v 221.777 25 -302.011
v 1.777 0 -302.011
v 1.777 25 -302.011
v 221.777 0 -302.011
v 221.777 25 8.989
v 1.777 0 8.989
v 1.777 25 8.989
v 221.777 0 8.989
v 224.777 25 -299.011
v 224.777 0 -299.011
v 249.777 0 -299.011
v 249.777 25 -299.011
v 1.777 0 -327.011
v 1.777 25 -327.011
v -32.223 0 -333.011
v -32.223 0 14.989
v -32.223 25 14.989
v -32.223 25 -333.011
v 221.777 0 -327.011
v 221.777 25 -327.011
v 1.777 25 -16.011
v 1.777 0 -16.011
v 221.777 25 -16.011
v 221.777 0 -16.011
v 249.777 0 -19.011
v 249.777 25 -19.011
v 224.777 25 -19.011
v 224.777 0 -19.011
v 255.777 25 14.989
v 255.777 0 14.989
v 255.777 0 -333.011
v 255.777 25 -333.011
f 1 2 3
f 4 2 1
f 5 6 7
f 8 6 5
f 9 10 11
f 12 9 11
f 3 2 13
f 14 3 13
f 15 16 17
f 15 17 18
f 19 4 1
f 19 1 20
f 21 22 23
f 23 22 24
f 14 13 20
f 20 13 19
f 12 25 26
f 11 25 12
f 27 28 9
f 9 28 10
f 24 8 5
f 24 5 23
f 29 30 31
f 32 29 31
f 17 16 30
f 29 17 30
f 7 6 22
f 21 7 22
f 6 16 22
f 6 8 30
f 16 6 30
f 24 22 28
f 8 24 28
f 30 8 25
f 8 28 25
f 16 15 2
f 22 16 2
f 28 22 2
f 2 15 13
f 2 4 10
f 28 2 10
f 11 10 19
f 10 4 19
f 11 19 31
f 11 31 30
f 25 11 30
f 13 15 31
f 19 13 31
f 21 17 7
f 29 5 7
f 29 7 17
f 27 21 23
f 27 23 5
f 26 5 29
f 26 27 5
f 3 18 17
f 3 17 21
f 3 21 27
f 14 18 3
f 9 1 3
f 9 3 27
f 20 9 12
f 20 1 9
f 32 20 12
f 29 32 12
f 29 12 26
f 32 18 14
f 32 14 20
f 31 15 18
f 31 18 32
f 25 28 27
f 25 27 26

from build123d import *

# Parameters (mm, degrees)
SKETCH1_W           = 288
SKETCH1_H           = 348
BOSS_EXTRUDE1_DEPTH = 25
SKETCH2_W           = 220
SKETCH2_H           = 25
SKETCH2_W_2         = 25
SKETCH2_H_2         = 280
CUT_EXTRUDE5_DEPTH  = 25


with BuildPart() as part:
    # Sketch1 → Boss-Extrude1 (new body)
    with BuildSketch(Plane(origin=(0, 0, 0), x_dir=(1, 0, 0), z_dir=(0, 1, 0))):
        with Locations((111.777306141, 159.011164947)):
            Rectangle(SKETCH1_W, SKETCH1_H)
    extrude(amount=BOSS_EXTRUDE1_DEPTH)

    # Sketch2 → Cut-Extrude5 (cut)
    with BuildSketch(Plane(origin=(0, 0, 0), x_dir=(1, 0, 0), z_dir=(0, 1, 0))):
        with Locations((111.777306141, 314.511164947)):
            Rectangle(SKETCH2_W, SKETCH2_H)
        with Locations((111.777306141, 3.511164947)):
            Rectangle(SKETCH2_W, SKETCH2_H)
        with Locations((237.277306141, 159.011164947)):
            Rectangle(SKETCH2_W_2, SKETCH2_H_2)
    extrude(amount=CUT_EXTRUDE5_DEPTH, mode=Mode.SUBTRACT)


solid = part.part
